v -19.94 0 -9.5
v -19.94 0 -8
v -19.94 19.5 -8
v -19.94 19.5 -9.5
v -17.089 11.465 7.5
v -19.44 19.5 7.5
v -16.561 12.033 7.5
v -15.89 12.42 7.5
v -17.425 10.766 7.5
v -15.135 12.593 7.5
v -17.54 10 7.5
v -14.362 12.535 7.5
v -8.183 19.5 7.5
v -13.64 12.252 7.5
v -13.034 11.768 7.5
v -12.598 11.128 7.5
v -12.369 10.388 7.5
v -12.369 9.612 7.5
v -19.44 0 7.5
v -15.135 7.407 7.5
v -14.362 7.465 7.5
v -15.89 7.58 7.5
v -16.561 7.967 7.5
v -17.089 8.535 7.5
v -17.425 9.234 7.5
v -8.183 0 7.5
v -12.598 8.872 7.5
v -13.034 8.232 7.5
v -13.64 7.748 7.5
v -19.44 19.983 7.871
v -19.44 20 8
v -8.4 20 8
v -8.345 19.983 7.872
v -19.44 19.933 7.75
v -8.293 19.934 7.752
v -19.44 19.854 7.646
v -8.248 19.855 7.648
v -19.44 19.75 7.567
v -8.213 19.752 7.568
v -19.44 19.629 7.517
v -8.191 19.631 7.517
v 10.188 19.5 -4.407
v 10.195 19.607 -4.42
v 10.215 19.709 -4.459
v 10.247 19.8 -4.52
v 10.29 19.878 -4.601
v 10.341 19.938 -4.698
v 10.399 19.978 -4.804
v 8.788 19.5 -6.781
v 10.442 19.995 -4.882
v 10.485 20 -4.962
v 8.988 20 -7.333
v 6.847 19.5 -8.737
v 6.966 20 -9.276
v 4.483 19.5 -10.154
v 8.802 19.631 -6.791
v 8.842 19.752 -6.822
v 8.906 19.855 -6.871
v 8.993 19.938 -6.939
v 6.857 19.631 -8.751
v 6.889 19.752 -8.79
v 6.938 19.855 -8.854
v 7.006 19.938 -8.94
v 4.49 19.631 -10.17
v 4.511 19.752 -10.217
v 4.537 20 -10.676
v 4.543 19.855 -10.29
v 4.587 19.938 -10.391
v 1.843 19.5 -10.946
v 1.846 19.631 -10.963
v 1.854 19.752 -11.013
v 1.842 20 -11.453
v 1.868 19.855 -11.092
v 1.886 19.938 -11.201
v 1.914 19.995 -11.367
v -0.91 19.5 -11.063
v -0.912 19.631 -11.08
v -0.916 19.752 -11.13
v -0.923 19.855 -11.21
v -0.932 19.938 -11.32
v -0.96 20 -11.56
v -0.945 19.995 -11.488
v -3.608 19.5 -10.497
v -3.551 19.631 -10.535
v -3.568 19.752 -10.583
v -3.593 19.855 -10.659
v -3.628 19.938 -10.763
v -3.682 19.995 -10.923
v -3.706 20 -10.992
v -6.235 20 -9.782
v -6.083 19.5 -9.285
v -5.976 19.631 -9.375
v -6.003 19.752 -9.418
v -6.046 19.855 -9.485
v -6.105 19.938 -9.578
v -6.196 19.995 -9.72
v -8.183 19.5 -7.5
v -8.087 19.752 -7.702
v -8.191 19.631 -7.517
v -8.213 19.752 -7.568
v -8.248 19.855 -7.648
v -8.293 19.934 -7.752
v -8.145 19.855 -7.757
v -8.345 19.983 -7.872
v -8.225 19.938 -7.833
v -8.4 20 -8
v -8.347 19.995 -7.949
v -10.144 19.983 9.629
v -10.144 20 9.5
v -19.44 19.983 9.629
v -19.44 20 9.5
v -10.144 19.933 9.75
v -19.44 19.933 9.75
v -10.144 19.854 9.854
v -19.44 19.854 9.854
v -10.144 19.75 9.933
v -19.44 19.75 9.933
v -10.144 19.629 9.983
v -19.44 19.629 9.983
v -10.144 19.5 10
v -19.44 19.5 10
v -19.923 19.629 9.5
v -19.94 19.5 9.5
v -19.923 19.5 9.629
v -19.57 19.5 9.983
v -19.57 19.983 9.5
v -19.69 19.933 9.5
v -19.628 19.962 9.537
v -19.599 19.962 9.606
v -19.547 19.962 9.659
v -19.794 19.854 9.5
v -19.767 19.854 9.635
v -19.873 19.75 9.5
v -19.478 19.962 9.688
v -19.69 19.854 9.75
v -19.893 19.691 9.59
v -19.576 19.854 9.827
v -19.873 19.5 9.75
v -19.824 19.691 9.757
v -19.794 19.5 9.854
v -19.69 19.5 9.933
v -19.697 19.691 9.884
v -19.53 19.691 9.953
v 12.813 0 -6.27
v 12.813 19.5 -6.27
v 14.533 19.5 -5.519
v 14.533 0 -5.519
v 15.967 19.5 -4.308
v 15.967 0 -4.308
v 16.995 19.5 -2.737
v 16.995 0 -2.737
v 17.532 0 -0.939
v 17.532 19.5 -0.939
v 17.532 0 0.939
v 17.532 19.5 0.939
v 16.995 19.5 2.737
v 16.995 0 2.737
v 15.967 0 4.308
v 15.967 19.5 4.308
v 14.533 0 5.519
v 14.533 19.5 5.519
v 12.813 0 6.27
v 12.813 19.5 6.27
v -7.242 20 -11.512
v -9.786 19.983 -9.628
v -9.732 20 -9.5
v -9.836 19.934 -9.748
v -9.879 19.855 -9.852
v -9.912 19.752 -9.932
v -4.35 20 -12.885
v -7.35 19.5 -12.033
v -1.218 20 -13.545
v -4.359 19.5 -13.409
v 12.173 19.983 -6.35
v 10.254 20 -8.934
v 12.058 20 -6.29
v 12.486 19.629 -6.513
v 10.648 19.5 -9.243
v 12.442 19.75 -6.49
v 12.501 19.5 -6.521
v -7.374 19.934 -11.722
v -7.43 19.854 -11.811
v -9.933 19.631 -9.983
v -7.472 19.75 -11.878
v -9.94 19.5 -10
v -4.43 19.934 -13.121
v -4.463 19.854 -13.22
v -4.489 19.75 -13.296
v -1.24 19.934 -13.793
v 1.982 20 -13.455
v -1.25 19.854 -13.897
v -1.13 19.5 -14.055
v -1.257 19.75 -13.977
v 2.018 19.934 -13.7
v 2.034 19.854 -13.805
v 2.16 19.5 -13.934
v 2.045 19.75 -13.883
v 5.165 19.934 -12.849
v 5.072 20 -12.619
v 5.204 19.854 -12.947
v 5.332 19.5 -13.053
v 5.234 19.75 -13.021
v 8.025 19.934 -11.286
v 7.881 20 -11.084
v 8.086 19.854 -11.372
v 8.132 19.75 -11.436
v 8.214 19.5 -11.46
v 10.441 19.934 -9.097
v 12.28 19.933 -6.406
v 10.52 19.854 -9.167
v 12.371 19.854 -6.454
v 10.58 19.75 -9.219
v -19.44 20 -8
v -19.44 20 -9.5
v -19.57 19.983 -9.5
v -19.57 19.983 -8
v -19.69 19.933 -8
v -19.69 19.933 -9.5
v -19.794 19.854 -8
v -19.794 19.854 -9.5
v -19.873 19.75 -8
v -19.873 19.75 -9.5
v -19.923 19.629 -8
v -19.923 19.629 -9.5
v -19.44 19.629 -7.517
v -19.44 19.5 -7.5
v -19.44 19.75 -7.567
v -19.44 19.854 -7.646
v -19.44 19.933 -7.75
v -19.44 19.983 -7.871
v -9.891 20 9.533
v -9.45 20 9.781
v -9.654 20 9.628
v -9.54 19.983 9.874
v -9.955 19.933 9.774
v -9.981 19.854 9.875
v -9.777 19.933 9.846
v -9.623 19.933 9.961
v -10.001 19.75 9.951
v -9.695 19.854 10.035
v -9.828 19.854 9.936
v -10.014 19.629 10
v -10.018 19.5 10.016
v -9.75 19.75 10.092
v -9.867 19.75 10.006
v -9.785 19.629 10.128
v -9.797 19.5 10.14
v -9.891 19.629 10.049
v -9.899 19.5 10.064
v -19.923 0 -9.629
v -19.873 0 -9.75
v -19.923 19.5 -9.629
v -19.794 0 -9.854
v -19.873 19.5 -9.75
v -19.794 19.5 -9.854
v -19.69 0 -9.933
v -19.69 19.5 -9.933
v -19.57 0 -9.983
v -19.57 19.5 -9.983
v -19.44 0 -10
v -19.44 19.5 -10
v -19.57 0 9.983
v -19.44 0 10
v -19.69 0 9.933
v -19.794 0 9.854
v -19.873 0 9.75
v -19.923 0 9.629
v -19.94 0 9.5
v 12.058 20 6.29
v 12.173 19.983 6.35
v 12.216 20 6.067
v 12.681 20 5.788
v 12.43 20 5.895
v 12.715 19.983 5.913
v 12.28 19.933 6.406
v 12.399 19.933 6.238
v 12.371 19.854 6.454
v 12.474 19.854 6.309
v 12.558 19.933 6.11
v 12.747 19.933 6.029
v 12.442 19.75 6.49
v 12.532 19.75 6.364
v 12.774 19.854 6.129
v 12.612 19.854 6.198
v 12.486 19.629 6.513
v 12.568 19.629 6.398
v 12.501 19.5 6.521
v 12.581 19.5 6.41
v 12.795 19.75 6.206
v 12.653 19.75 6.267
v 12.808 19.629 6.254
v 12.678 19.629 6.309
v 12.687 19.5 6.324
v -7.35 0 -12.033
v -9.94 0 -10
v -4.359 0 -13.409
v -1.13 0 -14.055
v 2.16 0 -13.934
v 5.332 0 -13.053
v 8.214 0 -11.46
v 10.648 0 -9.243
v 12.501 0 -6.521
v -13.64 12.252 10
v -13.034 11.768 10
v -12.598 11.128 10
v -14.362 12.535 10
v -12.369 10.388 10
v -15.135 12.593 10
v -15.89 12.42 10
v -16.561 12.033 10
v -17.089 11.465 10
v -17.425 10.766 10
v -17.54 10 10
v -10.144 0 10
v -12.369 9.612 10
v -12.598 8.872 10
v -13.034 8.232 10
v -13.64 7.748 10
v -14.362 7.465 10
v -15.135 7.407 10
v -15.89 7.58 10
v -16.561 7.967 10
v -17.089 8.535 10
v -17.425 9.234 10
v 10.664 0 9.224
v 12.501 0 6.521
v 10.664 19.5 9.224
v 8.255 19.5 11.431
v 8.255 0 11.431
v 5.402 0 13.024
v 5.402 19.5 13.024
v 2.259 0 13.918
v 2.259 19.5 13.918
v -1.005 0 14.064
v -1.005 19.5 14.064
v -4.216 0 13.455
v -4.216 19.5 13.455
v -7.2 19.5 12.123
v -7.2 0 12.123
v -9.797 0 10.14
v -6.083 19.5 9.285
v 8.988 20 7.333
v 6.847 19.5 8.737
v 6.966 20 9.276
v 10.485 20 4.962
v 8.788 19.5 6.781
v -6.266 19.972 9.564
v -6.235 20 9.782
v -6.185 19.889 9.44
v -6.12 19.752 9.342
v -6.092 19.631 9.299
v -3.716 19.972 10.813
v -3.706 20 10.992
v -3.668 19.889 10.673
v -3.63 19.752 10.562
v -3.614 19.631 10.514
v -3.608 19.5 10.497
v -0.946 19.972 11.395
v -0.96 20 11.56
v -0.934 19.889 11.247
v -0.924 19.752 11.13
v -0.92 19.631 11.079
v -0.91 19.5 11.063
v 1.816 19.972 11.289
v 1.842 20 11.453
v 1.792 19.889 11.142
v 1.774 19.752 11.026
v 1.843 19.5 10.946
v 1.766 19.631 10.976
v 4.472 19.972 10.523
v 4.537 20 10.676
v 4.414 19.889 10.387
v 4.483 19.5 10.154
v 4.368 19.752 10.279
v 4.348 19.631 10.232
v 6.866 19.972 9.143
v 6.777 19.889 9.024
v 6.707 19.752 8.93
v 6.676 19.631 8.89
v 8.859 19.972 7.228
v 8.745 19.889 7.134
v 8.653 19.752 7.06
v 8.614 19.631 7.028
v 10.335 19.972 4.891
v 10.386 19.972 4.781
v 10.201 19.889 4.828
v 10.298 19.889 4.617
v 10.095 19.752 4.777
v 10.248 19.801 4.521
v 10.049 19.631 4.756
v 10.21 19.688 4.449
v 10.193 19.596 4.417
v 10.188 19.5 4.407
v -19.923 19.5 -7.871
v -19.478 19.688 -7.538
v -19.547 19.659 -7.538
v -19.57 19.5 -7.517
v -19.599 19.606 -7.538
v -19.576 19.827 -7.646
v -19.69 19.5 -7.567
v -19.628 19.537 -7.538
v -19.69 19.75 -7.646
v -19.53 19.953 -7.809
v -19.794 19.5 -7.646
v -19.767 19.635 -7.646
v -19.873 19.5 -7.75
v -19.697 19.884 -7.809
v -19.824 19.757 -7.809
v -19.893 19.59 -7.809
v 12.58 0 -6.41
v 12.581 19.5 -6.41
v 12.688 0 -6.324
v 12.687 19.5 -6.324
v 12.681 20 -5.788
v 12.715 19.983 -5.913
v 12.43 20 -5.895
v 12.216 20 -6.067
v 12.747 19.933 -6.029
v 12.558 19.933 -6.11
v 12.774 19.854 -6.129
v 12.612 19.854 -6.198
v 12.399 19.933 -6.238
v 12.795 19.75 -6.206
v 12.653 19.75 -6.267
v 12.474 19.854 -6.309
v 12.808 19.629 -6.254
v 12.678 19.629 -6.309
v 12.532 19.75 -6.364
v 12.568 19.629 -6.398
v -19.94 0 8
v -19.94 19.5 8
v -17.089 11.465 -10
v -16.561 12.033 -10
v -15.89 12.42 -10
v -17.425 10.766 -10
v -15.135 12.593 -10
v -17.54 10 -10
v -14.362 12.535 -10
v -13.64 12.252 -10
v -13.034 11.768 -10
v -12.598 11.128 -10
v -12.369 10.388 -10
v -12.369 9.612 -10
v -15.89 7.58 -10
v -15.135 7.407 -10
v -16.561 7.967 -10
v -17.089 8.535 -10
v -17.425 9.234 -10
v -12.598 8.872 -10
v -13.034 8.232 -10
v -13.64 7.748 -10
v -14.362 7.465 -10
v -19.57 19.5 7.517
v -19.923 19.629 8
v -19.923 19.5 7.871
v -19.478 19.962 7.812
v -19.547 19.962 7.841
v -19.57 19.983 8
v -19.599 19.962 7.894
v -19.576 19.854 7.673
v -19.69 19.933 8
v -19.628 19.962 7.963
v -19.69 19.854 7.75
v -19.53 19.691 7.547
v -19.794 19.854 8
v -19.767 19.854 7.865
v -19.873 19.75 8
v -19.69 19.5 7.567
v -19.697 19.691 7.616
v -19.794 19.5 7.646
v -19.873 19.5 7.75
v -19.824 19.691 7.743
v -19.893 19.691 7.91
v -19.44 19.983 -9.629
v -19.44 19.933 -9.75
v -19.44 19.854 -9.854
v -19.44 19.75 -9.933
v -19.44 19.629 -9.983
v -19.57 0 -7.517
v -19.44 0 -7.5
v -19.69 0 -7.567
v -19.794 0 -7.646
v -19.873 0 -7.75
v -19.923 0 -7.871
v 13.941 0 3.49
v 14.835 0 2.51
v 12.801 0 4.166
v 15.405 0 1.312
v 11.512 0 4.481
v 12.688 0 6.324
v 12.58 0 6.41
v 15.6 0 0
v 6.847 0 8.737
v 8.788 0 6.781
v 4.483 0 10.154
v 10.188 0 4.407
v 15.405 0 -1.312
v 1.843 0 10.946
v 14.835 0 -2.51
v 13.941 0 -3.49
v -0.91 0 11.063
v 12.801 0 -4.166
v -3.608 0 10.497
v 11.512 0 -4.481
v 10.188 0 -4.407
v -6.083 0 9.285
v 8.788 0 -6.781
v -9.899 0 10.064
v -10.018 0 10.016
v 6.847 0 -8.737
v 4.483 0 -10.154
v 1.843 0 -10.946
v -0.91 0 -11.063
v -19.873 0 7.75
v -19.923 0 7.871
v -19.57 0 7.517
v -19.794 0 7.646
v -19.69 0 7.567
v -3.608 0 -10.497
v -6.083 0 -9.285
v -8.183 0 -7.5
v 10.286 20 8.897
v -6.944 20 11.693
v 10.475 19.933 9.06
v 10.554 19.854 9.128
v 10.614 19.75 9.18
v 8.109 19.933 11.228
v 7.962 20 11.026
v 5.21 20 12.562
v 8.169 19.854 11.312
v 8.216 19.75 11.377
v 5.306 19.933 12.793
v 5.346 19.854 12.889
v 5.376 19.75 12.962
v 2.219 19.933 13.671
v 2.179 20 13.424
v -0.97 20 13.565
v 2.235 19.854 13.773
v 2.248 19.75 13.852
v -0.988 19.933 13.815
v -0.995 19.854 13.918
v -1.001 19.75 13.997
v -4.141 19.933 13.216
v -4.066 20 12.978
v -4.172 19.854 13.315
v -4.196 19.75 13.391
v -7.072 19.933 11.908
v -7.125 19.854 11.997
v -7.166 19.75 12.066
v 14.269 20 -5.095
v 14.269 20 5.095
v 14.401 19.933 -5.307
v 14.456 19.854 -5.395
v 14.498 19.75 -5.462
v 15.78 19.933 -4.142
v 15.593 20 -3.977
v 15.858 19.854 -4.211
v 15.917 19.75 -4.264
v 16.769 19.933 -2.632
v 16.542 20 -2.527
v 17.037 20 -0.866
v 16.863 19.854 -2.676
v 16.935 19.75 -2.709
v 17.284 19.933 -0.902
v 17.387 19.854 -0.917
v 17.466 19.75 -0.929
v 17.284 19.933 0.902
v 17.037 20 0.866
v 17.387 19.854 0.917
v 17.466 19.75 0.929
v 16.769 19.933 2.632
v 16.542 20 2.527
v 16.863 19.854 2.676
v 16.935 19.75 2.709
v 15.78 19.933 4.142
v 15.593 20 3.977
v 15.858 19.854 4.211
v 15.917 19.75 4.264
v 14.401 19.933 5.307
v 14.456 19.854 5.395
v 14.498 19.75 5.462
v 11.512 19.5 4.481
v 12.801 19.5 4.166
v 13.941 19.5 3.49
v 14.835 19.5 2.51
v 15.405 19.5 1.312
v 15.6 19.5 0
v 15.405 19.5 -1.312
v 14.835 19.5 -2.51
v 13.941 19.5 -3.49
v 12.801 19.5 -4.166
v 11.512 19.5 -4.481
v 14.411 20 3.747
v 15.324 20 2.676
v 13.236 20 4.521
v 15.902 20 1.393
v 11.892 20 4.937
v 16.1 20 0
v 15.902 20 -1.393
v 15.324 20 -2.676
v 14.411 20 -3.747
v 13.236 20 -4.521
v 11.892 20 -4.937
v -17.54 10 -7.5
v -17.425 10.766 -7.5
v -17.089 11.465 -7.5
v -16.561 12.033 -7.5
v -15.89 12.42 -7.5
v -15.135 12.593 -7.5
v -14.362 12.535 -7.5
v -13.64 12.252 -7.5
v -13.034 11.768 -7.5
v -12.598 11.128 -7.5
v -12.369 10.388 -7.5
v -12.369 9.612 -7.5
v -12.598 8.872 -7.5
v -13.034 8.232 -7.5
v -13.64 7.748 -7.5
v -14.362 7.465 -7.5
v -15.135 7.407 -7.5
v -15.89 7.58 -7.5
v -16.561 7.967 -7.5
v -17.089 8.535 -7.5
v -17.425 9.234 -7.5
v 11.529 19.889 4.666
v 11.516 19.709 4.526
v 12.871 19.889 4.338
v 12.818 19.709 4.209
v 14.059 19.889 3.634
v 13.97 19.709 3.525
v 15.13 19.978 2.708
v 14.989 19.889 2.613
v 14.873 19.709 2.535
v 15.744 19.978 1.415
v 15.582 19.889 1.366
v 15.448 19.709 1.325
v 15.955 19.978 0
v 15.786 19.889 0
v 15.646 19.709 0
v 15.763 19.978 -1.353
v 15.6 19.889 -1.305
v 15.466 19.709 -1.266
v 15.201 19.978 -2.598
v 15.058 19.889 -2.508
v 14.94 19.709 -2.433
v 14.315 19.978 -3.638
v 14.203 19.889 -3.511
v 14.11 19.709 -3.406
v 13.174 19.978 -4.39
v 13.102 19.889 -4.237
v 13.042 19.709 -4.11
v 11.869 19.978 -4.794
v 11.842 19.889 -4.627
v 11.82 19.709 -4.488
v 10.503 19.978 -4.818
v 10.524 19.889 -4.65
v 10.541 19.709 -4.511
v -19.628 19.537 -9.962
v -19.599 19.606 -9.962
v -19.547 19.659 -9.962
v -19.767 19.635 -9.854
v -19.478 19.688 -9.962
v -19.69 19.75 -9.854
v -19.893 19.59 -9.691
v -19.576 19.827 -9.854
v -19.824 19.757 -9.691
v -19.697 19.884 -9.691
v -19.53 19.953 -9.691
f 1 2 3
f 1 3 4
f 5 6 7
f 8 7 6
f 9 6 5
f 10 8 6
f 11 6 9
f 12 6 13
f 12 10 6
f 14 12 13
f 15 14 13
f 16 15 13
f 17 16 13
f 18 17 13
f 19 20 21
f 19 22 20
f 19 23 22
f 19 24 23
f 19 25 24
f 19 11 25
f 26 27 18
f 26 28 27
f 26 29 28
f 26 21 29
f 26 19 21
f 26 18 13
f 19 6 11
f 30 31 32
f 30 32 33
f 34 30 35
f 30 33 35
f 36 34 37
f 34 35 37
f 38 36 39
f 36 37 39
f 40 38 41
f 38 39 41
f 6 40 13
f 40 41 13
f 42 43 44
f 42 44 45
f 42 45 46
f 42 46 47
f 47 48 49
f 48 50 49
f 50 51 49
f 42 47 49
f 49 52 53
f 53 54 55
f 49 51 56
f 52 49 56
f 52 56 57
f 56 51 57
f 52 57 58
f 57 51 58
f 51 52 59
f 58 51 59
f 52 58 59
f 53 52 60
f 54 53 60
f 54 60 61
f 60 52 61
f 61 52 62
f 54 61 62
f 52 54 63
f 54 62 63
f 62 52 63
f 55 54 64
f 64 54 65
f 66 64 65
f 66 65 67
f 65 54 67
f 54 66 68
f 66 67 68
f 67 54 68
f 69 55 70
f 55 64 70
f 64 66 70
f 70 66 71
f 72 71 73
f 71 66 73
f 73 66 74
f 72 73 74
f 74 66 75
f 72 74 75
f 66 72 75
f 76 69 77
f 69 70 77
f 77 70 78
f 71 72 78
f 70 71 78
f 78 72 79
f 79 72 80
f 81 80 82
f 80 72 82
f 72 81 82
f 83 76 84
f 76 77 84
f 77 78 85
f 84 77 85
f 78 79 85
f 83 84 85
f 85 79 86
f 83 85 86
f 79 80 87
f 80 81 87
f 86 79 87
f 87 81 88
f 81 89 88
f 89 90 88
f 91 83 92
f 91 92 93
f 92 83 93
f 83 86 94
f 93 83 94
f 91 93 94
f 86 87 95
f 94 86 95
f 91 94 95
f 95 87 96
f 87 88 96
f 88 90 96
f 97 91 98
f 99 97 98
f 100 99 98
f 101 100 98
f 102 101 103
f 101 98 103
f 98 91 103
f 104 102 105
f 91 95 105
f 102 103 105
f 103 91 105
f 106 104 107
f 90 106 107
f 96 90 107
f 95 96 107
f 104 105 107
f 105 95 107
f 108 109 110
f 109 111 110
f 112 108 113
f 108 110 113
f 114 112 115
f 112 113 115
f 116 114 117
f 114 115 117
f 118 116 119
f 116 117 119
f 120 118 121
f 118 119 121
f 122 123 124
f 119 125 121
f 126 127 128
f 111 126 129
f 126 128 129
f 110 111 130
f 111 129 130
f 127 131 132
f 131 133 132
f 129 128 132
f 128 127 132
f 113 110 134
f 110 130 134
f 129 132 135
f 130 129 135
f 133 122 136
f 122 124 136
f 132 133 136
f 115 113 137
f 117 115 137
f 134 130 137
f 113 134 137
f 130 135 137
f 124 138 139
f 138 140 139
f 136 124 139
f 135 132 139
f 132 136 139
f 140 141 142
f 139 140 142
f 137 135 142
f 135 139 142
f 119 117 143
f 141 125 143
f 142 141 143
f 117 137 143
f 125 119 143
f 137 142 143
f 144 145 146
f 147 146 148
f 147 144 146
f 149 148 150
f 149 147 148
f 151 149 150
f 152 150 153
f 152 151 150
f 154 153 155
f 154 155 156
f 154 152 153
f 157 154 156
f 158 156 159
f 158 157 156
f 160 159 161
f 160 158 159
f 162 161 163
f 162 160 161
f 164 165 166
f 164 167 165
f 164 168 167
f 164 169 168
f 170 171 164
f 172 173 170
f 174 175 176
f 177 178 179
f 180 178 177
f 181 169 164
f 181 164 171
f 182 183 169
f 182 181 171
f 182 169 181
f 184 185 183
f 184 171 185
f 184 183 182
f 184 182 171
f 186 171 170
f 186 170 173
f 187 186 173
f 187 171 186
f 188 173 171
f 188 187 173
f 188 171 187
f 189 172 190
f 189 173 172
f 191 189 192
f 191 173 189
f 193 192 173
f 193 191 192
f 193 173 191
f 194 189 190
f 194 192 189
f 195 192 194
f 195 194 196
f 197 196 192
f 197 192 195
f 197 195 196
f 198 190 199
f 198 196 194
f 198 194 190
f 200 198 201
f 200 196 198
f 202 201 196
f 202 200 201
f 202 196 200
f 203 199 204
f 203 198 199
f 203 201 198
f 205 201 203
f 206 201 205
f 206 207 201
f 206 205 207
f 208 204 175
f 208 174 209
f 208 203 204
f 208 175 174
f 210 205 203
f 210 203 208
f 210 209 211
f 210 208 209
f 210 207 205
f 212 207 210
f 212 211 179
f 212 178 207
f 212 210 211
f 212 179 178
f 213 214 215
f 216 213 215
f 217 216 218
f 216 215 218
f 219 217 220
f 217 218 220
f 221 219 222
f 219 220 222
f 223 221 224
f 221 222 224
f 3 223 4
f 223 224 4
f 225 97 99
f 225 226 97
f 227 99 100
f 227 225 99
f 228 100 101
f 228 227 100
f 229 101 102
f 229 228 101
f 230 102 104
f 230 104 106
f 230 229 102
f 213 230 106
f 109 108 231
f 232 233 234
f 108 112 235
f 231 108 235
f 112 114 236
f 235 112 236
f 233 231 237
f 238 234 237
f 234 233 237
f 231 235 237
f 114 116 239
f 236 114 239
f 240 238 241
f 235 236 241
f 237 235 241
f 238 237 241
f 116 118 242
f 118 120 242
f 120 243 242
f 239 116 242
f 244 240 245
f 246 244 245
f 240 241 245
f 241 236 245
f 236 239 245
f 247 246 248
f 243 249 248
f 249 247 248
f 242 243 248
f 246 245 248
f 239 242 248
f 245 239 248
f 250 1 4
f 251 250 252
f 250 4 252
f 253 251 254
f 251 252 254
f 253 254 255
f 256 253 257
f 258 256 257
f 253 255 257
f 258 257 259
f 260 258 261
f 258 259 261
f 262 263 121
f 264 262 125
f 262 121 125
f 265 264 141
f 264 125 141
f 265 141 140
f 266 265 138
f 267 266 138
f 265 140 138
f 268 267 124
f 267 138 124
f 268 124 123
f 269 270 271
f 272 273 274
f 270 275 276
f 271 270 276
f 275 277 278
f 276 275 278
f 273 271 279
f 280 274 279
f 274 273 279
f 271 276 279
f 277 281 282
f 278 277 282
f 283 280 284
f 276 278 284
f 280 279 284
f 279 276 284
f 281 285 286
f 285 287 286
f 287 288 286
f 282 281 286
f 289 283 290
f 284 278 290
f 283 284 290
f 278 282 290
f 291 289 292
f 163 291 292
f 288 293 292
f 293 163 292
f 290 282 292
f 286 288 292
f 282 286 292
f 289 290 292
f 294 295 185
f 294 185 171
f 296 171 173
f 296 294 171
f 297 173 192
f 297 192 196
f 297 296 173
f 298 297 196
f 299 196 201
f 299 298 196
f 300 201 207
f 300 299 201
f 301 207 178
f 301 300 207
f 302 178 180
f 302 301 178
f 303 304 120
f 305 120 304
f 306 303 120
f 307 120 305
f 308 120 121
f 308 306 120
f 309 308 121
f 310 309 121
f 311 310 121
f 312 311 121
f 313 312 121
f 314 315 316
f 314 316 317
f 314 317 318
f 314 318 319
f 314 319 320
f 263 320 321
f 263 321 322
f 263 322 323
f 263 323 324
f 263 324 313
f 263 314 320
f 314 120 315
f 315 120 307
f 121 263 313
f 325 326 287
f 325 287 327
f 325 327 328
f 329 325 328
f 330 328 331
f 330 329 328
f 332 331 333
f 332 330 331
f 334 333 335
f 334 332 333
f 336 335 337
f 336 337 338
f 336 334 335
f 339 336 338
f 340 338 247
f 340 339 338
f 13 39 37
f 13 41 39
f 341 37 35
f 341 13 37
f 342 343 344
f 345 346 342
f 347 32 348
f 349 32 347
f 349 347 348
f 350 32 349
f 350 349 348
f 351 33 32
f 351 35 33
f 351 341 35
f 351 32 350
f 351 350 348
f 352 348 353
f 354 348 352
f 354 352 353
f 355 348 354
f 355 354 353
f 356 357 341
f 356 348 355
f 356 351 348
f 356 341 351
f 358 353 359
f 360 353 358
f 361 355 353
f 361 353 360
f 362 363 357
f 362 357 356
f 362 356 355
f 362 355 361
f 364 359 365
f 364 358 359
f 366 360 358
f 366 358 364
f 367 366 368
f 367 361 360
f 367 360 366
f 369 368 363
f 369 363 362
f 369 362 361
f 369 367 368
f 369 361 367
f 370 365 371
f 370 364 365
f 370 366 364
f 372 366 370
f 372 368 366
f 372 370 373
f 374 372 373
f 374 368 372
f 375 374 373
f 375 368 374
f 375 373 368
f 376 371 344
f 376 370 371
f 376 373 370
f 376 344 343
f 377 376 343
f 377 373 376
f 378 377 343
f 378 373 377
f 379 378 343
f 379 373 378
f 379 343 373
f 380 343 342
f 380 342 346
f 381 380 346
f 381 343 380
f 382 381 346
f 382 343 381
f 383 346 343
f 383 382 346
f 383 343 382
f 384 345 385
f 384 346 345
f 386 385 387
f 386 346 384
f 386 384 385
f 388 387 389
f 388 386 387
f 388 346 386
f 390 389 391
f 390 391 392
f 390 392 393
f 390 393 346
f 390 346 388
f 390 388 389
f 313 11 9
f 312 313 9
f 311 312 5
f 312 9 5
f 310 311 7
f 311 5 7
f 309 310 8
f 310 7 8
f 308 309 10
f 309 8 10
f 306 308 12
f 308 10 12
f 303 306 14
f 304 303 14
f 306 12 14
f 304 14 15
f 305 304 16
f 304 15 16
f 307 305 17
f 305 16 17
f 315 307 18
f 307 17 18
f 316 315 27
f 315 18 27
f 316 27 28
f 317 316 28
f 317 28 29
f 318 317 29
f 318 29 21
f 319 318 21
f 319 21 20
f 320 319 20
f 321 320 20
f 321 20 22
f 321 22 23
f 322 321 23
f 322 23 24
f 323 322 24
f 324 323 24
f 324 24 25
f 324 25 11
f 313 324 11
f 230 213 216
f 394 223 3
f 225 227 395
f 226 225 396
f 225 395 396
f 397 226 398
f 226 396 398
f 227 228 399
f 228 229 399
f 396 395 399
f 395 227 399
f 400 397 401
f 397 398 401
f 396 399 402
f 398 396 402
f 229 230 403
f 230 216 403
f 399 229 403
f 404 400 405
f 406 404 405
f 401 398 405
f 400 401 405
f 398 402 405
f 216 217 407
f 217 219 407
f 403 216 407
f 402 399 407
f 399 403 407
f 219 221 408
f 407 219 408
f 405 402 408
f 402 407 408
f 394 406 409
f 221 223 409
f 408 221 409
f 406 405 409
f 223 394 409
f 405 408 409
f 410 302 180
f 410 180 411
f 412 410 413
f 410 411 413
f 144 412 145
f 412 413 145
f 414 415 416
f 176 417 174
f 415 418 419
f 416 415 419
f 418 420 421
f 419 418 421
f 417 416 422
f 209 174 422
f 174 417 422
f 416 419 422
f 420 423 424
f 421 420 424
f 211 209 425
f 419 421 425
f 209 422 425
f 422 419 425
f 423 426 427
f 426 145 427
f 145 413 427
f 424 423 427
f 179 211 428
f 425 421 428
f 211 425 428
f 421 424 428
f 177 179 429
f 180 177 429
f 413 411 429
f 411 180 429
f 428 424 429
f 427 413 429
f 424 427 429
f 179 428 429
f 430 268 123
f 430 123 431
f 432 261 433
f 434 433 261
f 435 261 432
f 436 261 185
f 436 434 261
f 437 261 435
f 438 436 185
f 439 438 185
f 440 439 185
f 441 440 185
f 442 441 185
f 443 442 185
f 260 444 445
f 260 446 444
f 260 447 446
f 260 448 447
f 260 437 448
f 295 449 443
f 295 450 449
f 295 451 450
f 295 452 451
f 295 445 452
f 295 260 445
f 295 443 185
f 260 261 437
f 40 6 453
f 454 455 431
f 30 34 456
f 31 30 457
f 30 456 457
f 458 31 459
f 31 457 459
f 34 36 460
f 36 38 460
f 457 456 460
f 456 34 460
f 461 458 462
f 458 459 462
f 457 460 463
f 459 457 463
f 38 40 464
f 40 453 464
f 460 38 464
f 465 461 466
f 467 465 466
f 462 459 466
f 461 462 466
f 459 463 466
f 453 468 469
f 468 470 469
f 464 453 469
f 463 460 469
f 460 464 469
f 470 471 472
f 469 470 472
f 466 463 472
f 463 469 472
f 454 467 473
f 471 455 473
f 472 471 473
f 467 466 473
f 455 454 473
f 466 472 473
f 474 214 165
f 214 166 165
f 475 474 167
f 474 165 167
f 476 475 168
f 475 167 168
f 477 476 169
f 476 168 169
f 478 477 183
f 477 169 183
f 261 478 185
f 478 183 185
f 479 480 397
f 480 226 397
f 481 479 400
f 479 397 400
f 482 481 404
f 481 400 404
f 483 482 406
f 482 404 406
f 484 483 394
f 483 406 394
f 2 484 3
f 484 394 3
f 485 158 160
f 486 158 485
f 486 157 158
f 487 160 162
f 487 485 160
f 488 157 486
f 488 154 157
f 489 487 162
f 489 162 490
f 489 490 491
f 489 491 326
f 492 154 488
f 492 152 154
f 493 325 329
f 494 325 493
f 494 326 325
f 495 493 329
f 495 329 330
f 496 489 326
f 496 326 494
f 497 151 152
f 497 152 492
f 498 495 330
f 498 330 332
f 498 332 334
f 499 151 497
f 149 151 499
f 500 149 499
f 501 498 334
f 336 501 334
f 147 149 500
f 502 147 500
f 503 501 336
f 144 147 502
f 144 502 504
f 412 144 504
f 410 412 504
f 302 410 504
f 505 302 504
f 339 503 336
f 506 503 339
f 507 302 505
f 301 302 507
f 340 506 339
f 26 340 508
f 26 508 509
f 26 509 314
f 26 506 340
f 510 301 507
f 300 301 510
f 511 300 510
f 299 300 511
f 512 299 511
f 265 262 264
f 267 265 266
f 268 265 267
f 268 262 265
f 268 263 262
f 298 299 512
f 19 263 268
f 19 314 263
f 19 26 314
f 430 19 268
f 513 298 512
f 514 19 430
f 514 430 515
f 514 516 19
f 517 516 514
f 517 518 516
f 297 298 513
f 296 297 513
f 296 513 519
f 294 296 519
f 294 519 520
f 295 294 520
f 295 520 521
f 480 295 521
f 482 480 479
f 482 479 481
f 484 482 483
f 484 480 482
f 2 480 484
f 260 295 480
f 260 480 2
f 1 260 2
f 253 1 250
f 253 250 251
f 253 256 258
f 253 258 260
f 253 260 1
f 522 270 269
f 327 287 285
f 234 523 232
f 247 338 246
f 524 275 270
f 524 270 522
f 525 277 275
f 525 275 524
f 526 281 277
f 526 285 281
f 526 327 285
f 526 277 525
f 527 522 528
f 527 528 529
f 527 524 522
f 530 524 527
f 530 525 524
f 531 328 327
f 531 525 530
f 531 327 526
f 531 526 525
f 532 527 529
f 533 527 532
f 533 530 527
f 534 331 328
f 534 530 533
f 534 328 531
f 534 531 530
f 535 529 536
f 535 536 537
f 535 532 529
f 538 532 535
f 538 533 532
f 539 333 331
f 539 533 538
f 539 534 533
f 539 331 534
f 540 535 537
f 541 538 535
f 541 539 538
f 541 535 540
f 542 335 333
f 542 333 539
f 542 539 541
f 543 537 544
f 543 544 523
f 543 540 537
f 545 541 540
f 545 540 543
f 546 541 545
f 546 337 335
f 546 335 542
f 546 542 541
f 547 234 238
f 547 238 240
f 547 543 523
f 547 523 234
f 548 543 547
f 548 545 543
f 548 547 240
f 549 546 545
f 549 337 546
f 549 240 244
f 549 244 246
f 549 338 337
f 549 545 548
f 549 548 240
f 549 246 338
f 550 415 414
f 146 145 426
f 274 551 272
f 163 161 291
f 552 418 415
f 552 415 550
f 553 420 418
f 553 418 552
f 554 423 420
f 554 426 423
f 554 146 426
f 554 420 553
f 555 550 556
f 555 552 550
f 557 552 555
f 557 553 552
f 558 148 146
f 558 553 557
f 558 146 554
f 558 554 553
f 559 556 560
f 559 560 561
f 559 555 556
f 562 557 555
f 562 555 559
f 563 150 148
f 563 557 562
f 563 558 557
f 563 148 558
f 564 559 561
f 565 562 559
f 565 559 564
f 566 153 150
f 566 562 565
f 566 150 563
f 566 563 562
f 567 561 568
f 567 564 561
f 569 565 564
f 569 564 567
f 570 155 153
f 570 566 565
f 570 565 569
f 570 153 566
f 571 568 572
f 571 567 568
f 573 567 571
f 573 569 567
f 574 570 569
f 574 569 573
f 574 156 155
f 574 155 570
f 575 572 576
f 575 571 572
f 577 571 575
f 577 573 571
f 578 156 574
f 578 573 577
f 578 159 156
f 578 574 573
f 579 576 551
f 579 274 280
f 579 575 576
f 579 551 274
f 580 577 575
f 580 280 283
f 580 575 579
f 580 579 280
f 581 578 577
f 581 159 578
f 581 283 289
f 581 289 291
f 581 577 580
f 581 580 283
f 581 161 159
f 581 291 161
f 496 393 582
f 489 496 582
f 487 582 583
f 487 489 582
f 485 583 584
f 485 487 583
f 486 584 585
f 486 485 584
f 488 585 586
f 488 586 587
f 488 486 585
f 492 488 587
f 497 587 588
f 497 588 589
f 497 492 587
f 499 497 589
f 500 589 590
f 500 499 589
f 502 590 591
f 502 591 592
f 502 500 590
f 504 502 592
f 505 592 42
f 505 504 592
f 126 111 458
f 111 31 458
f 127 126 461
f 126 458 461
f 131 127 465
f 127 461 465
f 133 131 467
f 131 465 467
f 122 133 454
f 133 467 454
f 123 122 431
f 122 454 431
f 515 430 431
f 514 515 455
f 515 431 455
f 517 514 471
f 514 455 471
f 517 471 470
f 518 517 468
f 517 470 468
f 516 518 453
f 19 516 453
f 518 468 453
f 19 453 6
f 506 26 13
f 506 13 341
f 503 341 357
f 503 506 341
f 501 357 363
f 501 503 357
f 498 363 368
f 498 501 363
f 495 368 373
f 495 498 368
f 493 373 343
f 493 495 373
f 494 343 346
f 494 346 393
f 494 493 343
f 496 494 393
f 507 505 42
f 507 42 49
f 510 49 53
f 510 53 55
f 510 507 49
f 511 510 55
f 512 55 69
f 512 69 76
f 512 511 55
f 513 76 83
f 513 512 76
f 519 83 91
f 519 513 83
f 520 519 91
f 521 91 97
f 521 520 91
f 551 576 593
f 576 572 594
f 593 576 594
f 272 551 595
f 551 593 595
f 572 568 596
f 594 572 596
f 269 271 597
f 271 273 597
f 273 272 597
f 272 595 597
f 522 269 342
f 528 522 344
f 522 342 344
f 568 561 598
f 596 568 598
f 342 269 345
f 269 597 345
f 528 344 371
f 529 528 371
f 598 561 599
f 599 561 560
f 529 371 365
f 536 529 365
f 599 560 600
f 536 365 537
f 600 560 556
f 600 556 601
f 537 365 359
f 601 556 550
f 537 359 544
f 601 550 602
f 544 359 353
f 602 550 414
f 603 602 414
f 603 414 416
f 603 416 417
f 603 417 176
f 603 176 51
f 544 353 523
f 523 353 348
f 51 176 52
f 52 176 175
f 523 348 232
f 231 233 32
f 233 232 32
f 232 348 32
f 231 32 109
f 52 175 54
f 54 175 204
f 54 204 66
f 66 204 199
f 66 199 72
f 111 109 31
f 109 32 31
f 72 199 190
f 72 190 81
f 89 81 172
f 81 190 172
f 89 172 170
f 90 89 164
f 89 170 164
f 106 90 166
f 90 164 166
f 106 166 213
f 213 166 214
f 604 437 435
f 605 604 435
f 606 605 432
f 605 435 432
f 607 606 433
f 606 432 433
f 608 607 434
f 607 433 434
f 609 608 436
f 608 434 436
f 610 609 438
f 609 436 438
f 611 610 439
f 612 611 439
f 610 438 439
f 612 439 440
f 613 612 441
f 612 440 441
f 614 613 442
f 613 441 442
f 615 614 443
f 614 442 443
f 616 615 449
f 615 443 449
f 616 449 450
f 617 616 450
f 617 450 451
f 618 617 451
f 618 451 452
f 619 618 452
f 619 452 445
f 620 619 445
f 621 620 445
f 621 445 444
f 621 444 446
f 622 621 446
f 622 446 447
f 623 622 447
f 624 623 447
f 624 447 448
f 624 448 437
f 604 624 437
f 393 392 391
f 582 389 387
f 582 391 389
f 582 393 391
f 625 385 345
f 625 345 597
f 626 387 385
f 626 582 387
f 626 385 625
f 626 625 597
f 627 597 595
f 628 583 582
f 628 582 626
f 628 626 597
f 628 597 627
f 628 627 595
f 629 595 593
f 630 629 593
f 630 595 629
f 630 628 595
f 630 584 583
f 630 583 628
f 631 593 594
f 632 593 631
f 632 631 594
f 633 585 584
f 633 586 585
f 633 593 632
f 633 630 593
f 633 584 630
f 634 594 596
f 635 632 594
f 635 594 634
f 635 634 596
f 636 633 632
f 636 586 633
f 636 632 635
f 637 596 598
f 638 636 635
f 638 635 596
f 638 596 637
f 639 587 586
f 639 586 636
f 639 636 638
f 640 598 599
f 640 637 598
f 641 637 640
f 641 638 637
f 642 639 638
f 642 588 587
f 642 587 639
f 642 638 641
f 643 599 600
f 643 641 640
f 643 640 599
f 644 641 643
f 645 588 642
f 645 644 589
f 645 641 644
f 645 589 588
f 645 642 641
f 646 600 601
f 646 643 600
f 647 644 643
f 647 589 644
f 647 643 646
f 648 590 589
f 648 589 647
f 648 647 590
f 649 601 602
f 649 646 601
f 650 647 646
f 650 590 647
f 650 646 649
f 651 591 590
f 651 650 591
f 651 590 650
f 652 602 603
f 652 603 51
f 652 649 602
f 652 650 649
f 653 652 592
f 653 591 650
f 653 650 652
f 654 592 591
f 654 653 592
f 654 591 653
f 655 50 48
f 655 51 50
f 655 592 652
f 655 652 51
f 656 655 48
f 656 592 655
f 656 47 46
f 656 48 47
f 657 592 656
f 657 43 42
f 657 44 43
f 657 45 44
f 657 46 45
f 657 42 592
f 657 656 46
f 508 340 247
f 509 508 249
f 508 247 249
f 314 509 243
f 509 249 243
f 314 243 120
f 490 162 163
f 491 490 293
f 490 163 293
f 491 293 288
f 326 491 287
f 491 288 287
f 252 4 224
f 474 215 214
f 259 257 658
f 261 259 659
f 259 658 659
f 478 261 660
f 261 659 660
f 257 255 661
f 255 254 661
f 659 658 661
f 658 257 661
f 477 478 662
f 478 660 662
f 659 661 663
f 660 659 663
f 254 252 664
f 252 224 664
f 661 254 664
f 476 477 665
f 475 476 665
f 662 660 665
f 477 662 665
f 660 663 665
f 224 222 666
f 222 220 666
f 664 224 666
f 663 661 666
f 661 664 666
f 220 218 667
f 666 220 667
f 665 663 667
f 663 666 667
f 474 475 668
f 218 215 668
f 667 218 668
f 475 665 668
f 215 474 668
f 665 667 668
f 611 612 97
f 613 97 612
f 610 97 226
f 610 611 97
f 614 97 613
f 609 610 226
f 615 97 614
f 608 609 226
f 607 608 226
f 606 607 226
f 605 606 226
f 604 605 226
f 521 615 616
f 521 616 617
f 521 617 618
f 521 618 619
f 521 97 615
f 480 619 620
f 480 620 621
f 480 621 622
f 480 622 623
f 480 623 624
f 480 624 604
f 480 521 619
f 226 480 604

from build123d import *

# Parameters (mm, degrees)
BOSS_EXTRU_1_DEPTH      = 20
ESQUISSE2_R             = 2.6
ENL_V_MAT_EXTRU_1_DEPTH = 38.127165776
CONG_2_R                = 0.5


with BuildPart() as part:
    # Esquisse1 → Boss.-Extru.1 (new body)
    with BuildSketch(Plane(origin=(0, 0, 0), x_dir=(1, 0, 0), z_dir=(0, 1, 0))):
        with BuildLine():
            Line((-8.182909018, 7.5), (-19.940321926, 7.5))
            Line((-19.940321926, 7.5), (-19.940321926, 10))
            Line((-19.940321926, 10), (-9.940321926, 10))
            ThreePointArc((-9.940321926, 10), (2.269289353, 13.916189343), (12.602252252, 6.324020728))
            ThreePointArc((12.602252252, 6.324020728), (17.6, 0), (12.602252252, -6.324020728))
            ThreePointArc((12.602252252, -6.324020728), (2.269289353, -13.916189343), (-9.940321926, -10))
            Line((-9.940321926, -10), (-19.940321926, -10))
            Line((-19.940321926, -10), (-19.940321926, -7.5))
            Line((-19.940321926, -7.5), (-8.182909018, -7.5))
            ThreePointArc((-8.182909018, -7.5), (1.843161538, -10.945901313), (10.187837838, -4.406581463))
            ThreePointArc((10.187837838, -4.406581463), (15.6, 0), (10.187837838, 4.406581463))
            ThreePointArc((10.187837838, 4.406581463), (1.843161538, 10.945901313), (-8.182909018, 7.5))
        make_face()
    extrude(amount=BOSS_EXTRU_1_DEPTH)

    # Esquisse2 → Enlèv. mat.-Extru.1 (cut, through all)
    with BuildSketch(Plane(origin=(0, 0, -10), x_dir=(-1, 0, 0), z_dir=(0, 0, -1))):
        with Locations((14.940321926, 10)):
            Circle(ESQUISSE2_R)
    extrude(amount=-ENL_V_MAT_EXTRU_1_DEPTH, mode=Mode.SUBTRACT)

    # Congé2
    cong_2_edges = [part.edges().sort_by_distance(p)[0] for p in [
        (-19.940321926, 20, -8.75),
        (-14.061615472, 20, -7.5),
        (12.602252252, 10, -6.324020728),
        (12.602252252, 10, 6.324020728),
        (-9.940321926, 10, 10),
        (1.843161538, 20, -10.945901313),
        (-19.940321926, 10, 10),
        (-19.940321926, 10, 7.5),
        (-19.940321926, 10, -7.5),
        (-19.940321926, 10, -10),
        (15.6, 20, 0),
        (1.843161538, 20, 10.945901313),
        (-14.061615472, 20, 7.5),
        (-19.940321926, 20, 8.75),
        (-14.940321926, 20, 10),
        (2.269289353, 20, 13.916189343),
        (17.6, 20, 0),
        (2.269289353, 20, -13.916189343),
        (-14.940321926, 20, -10),
    ]]
    fillet(cong_2_edges, radius=CONG_2_R)


solid = part.part
